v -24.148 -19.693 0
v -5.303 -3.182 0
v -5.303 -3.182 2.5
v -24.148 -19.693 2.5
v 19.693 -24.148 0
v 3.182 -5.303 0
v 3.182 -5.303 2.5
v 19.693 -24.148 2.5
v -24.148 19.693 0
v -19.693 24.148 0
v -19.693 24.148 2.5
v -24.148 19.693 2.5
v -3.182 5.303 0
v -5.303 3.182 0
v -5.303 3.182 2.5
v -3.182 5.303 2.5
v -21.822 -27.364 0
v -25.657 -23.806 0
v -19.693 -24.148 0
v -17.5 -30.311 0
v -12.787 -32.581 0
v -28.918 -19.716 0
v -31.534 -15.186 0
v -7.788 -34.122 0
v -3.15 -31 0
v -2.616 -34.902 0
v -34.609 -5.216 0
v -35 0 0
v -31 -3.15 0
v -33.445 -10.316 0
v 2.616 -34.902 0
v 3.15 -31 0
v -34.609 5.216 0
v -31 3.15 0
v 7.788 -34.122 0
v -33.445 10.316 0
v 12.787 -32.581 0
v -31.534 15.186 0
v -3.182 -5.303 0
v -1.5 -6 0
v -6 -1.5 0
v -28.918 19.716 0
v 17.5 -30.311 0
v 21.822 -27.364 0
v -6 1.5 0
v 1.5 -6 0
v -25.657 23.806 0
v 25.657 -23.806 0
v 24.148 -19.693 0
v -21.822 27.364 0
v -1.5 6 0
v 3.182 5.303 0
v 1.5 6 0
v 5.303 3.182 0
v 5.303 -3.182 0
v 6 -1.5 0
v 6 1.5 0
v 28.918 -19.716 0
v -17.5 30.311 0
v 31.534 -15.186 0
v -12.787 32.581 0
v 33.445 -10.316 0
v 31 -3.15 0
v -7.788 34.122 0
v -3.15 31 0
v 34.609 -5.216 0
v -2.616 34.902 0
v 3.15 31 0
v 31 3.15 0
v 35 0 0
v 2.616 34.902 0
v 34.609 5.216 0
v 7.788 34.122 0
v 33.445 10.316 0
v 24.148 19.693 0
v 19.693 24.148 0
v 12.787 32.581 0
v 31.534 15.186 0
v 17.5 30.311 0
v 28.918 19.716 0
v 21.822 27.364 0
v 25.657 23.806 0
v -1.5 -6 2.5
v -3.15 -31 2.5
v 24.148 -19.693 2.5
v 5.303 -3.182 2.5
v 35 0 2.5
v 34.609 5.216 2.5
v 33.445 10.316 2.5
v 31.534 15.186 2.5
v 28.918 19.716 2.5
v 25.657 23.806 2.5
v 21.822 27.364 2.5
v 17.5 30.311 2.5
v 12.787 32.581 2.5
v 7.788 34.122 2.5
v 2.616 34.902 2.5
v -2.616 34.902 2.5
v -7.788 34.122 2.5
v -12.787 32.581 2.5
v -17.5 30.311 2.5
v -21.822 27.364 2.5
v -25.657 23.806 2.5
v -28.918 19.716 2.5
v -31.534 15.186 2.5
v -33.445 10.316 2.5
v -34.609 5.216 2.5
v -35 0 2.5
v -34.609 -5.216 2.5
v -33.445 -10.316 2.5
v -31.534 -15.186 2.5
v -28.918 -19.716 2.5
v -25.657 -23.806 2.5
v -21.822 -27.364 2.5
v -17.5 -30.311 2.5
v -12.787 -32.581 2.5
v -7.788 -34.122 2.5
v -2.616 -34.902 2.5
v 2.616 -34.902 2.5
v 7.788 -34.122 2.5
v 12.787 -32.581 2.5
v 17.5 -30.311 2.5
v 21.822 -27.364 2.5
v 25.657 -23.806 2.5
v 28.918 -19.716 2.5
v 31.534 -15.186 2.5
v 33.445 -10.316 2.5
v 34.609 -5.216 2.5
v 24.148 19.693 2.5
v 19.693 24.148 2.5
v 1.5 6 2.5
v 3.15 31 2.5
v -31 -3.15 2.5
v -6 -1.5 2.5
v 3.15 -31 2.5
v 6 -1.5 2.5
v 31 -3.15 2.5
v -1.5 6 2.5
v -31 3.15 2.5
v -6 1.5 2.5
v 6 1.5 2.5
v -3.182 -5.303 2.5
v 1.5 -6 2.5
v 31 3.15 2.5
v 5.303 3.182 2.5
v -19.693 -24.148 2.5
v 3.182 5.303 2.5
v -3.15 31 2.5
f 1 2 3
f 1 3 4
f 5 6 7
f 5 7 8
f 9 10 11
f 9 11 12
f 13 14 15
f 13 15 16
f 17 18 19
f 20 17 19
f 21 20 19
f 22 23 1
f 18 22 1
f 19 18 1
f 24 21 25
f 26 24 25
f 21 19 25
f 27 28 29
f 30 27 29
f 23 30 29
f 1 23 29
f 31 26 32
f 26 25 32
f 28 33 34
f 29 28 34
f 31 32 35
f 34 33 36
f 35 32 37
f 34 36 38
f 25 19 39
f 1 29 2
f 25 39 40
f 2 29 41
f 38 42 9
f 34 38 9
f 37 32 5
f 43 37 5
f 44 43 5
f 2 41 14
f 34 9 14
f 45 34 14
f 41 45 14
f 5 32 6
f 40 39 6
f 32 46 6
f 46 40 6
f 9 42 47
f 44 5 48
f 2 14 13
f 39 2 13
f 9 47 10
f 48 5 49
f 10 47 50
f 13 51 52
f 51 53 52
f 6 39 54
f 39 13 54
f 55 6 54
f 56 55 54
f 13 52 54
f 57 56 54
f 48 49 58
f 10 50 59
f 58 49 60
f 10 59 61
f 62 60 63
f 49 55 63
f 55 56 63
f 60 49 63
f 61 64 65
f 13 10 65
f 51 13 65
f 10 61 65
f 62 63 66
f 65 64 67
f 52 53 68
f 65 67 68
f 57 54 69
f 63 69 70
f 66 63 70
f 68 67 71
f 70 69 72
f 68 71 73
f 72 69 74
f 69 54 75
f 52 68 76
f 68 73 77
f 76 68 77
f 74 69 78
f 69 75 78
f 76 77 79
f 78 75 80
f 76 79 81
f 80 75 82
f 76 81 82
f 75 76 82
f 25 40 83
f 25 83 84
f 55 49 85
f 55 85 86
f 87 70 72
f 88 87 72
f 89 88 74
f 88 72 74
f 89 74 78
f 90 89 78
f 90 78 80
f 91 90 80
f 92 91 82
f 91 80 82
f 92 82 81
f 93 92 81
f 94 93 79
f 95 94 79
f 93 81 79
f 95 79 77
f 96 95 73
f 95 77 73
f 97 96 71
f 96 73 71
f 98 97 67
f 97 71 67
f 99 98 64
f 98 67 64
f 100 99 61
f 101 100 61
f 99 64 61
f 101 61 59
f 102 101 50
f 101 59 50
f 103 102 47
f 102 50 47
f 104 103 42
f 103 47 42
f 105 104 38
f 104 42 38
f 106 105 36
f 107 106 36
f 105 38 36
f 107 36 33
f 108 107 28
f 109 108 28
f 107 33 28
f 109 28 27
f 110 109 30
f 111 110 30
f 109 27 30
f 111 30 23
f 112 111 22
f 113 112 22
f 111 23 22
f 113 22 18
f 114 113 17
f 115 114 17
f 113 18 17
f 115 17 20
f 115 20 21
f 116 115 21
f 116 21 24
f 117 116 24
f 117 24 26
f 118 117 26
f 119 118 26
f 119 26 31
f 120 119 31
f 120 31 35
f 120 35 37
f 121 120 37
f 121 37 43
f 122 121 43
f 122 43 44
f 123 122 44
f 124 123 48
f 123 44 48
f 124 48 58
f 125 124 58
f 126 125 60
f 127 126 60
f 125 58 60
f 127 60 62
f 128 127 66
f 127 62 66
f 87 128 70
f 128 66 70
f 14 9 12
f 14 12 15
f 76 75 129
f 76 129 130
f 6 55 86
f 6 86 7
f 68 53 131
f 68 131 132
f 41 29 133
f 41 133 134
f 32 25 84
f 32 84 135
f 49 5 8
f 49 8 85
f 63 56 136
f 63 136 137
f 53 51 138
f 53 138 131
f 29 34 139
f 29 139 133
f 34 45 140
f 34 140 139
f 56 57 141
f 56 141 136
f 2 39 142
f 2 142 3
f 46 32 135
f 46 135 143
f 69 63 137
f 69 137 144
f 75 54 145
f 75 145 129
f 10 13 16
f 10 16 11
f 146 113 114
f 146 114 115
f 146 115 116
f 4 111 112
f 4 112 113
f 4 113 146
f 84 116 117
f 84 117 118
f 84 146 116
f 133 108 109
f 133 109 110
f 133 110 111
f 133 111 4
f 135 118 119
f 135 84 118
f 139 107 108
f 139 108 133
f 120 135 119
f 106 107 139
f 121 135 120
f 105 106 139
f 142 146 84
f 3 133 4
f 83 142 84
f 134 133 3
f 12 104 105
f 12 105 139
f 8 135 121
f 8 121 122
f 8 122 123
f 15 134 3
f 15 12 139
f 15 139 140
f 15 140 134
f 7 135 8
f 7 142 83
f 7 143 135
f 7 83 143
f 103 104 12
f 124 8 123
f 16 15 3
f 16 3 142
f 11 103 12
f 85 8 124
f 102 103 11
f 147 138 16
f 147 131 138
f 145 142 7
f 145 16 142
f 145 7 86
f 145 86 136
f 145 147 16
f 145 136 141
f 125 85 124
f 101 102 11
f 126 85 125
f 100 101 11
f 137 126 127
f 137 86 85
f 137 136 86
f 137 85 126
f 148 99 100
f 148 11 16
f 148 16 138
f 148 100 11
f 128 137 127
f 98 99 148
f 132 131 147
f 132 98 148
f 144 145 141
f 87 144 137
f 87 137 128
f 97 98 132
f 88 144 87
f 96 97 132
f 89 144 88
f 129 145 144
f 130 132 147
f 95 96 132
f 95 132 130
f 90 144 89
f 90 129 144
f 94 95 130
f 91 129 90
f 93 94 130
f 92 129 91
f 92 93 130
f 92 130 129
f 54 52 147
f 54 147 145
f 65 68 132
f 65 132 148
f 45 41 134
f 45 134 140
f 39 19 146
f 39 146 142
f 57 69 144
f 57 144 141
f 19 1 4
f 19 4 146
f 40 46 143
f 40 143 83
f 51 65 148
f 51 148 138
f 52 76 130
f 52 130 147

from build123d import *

# Parameters (mm, degrees)
SKETCH1_R           = 35
BOSS_EXTRUDE1_DEPTH = 2.5


with BuildPart() as part:
    # Sketch1 → Boss-Extrude1 (new body)
    with BuildSketch(Plane.XY):
        Circle(SKETCH1_R)
        Polygon((3.15, 31), (-3.15, 31), (-1.5, 6), (1.5, 6), align=None, mode=Mode.SUBTRACT)
        Polygon((19.692923856, 24.147696578), (3.181980515, 5.303300859), (5.303300859, 3.181980515), (24.147696578, 19.692923856), align=None, mode=Mode.SUBTRACT)
        Polygon((31, 3.15), (6, 1.5), (6, -1.5), (31, -3.15), align=None, mode=Mode.SUBTRACT)
        Polygon((24.147696578, -19.692923856), (5.303300859, -3.181980515), (3.181980515, -5.303300859), (19.692923856, -24.147696578), align=None, mode=Mode.SUBTRACT)
        Polygon((3.15, -31), (1.5, -6), (-1.5, -6), (-3.15, -31), align=None, mode=Mode.SUBTRACT)
        Polygon((-19.692923856, -24.147696578), (-3.181980515, -5.303300859), (-5.303300859, -3.181980515), (-24.147696578, -19.692923856), align=None, mode=Mode.SUBTRACT)
        Polygon((-31, -3.15), (-6, -1.5), (-6, 1.5), (-31, 3.15), align=None, mode=Mode.SUBTRACT)
        Polygon((-24.147696578, 19.692923856), (-5.303300859, 3.181980515), (-3.181980515, 5.303300859), (-19.692923856, 24.147696578), align=None, mode=Mode.SUBTRACT)
    extrude(amount=BOSS_EXTRUDE1_DEPTH)


solid = part.part
